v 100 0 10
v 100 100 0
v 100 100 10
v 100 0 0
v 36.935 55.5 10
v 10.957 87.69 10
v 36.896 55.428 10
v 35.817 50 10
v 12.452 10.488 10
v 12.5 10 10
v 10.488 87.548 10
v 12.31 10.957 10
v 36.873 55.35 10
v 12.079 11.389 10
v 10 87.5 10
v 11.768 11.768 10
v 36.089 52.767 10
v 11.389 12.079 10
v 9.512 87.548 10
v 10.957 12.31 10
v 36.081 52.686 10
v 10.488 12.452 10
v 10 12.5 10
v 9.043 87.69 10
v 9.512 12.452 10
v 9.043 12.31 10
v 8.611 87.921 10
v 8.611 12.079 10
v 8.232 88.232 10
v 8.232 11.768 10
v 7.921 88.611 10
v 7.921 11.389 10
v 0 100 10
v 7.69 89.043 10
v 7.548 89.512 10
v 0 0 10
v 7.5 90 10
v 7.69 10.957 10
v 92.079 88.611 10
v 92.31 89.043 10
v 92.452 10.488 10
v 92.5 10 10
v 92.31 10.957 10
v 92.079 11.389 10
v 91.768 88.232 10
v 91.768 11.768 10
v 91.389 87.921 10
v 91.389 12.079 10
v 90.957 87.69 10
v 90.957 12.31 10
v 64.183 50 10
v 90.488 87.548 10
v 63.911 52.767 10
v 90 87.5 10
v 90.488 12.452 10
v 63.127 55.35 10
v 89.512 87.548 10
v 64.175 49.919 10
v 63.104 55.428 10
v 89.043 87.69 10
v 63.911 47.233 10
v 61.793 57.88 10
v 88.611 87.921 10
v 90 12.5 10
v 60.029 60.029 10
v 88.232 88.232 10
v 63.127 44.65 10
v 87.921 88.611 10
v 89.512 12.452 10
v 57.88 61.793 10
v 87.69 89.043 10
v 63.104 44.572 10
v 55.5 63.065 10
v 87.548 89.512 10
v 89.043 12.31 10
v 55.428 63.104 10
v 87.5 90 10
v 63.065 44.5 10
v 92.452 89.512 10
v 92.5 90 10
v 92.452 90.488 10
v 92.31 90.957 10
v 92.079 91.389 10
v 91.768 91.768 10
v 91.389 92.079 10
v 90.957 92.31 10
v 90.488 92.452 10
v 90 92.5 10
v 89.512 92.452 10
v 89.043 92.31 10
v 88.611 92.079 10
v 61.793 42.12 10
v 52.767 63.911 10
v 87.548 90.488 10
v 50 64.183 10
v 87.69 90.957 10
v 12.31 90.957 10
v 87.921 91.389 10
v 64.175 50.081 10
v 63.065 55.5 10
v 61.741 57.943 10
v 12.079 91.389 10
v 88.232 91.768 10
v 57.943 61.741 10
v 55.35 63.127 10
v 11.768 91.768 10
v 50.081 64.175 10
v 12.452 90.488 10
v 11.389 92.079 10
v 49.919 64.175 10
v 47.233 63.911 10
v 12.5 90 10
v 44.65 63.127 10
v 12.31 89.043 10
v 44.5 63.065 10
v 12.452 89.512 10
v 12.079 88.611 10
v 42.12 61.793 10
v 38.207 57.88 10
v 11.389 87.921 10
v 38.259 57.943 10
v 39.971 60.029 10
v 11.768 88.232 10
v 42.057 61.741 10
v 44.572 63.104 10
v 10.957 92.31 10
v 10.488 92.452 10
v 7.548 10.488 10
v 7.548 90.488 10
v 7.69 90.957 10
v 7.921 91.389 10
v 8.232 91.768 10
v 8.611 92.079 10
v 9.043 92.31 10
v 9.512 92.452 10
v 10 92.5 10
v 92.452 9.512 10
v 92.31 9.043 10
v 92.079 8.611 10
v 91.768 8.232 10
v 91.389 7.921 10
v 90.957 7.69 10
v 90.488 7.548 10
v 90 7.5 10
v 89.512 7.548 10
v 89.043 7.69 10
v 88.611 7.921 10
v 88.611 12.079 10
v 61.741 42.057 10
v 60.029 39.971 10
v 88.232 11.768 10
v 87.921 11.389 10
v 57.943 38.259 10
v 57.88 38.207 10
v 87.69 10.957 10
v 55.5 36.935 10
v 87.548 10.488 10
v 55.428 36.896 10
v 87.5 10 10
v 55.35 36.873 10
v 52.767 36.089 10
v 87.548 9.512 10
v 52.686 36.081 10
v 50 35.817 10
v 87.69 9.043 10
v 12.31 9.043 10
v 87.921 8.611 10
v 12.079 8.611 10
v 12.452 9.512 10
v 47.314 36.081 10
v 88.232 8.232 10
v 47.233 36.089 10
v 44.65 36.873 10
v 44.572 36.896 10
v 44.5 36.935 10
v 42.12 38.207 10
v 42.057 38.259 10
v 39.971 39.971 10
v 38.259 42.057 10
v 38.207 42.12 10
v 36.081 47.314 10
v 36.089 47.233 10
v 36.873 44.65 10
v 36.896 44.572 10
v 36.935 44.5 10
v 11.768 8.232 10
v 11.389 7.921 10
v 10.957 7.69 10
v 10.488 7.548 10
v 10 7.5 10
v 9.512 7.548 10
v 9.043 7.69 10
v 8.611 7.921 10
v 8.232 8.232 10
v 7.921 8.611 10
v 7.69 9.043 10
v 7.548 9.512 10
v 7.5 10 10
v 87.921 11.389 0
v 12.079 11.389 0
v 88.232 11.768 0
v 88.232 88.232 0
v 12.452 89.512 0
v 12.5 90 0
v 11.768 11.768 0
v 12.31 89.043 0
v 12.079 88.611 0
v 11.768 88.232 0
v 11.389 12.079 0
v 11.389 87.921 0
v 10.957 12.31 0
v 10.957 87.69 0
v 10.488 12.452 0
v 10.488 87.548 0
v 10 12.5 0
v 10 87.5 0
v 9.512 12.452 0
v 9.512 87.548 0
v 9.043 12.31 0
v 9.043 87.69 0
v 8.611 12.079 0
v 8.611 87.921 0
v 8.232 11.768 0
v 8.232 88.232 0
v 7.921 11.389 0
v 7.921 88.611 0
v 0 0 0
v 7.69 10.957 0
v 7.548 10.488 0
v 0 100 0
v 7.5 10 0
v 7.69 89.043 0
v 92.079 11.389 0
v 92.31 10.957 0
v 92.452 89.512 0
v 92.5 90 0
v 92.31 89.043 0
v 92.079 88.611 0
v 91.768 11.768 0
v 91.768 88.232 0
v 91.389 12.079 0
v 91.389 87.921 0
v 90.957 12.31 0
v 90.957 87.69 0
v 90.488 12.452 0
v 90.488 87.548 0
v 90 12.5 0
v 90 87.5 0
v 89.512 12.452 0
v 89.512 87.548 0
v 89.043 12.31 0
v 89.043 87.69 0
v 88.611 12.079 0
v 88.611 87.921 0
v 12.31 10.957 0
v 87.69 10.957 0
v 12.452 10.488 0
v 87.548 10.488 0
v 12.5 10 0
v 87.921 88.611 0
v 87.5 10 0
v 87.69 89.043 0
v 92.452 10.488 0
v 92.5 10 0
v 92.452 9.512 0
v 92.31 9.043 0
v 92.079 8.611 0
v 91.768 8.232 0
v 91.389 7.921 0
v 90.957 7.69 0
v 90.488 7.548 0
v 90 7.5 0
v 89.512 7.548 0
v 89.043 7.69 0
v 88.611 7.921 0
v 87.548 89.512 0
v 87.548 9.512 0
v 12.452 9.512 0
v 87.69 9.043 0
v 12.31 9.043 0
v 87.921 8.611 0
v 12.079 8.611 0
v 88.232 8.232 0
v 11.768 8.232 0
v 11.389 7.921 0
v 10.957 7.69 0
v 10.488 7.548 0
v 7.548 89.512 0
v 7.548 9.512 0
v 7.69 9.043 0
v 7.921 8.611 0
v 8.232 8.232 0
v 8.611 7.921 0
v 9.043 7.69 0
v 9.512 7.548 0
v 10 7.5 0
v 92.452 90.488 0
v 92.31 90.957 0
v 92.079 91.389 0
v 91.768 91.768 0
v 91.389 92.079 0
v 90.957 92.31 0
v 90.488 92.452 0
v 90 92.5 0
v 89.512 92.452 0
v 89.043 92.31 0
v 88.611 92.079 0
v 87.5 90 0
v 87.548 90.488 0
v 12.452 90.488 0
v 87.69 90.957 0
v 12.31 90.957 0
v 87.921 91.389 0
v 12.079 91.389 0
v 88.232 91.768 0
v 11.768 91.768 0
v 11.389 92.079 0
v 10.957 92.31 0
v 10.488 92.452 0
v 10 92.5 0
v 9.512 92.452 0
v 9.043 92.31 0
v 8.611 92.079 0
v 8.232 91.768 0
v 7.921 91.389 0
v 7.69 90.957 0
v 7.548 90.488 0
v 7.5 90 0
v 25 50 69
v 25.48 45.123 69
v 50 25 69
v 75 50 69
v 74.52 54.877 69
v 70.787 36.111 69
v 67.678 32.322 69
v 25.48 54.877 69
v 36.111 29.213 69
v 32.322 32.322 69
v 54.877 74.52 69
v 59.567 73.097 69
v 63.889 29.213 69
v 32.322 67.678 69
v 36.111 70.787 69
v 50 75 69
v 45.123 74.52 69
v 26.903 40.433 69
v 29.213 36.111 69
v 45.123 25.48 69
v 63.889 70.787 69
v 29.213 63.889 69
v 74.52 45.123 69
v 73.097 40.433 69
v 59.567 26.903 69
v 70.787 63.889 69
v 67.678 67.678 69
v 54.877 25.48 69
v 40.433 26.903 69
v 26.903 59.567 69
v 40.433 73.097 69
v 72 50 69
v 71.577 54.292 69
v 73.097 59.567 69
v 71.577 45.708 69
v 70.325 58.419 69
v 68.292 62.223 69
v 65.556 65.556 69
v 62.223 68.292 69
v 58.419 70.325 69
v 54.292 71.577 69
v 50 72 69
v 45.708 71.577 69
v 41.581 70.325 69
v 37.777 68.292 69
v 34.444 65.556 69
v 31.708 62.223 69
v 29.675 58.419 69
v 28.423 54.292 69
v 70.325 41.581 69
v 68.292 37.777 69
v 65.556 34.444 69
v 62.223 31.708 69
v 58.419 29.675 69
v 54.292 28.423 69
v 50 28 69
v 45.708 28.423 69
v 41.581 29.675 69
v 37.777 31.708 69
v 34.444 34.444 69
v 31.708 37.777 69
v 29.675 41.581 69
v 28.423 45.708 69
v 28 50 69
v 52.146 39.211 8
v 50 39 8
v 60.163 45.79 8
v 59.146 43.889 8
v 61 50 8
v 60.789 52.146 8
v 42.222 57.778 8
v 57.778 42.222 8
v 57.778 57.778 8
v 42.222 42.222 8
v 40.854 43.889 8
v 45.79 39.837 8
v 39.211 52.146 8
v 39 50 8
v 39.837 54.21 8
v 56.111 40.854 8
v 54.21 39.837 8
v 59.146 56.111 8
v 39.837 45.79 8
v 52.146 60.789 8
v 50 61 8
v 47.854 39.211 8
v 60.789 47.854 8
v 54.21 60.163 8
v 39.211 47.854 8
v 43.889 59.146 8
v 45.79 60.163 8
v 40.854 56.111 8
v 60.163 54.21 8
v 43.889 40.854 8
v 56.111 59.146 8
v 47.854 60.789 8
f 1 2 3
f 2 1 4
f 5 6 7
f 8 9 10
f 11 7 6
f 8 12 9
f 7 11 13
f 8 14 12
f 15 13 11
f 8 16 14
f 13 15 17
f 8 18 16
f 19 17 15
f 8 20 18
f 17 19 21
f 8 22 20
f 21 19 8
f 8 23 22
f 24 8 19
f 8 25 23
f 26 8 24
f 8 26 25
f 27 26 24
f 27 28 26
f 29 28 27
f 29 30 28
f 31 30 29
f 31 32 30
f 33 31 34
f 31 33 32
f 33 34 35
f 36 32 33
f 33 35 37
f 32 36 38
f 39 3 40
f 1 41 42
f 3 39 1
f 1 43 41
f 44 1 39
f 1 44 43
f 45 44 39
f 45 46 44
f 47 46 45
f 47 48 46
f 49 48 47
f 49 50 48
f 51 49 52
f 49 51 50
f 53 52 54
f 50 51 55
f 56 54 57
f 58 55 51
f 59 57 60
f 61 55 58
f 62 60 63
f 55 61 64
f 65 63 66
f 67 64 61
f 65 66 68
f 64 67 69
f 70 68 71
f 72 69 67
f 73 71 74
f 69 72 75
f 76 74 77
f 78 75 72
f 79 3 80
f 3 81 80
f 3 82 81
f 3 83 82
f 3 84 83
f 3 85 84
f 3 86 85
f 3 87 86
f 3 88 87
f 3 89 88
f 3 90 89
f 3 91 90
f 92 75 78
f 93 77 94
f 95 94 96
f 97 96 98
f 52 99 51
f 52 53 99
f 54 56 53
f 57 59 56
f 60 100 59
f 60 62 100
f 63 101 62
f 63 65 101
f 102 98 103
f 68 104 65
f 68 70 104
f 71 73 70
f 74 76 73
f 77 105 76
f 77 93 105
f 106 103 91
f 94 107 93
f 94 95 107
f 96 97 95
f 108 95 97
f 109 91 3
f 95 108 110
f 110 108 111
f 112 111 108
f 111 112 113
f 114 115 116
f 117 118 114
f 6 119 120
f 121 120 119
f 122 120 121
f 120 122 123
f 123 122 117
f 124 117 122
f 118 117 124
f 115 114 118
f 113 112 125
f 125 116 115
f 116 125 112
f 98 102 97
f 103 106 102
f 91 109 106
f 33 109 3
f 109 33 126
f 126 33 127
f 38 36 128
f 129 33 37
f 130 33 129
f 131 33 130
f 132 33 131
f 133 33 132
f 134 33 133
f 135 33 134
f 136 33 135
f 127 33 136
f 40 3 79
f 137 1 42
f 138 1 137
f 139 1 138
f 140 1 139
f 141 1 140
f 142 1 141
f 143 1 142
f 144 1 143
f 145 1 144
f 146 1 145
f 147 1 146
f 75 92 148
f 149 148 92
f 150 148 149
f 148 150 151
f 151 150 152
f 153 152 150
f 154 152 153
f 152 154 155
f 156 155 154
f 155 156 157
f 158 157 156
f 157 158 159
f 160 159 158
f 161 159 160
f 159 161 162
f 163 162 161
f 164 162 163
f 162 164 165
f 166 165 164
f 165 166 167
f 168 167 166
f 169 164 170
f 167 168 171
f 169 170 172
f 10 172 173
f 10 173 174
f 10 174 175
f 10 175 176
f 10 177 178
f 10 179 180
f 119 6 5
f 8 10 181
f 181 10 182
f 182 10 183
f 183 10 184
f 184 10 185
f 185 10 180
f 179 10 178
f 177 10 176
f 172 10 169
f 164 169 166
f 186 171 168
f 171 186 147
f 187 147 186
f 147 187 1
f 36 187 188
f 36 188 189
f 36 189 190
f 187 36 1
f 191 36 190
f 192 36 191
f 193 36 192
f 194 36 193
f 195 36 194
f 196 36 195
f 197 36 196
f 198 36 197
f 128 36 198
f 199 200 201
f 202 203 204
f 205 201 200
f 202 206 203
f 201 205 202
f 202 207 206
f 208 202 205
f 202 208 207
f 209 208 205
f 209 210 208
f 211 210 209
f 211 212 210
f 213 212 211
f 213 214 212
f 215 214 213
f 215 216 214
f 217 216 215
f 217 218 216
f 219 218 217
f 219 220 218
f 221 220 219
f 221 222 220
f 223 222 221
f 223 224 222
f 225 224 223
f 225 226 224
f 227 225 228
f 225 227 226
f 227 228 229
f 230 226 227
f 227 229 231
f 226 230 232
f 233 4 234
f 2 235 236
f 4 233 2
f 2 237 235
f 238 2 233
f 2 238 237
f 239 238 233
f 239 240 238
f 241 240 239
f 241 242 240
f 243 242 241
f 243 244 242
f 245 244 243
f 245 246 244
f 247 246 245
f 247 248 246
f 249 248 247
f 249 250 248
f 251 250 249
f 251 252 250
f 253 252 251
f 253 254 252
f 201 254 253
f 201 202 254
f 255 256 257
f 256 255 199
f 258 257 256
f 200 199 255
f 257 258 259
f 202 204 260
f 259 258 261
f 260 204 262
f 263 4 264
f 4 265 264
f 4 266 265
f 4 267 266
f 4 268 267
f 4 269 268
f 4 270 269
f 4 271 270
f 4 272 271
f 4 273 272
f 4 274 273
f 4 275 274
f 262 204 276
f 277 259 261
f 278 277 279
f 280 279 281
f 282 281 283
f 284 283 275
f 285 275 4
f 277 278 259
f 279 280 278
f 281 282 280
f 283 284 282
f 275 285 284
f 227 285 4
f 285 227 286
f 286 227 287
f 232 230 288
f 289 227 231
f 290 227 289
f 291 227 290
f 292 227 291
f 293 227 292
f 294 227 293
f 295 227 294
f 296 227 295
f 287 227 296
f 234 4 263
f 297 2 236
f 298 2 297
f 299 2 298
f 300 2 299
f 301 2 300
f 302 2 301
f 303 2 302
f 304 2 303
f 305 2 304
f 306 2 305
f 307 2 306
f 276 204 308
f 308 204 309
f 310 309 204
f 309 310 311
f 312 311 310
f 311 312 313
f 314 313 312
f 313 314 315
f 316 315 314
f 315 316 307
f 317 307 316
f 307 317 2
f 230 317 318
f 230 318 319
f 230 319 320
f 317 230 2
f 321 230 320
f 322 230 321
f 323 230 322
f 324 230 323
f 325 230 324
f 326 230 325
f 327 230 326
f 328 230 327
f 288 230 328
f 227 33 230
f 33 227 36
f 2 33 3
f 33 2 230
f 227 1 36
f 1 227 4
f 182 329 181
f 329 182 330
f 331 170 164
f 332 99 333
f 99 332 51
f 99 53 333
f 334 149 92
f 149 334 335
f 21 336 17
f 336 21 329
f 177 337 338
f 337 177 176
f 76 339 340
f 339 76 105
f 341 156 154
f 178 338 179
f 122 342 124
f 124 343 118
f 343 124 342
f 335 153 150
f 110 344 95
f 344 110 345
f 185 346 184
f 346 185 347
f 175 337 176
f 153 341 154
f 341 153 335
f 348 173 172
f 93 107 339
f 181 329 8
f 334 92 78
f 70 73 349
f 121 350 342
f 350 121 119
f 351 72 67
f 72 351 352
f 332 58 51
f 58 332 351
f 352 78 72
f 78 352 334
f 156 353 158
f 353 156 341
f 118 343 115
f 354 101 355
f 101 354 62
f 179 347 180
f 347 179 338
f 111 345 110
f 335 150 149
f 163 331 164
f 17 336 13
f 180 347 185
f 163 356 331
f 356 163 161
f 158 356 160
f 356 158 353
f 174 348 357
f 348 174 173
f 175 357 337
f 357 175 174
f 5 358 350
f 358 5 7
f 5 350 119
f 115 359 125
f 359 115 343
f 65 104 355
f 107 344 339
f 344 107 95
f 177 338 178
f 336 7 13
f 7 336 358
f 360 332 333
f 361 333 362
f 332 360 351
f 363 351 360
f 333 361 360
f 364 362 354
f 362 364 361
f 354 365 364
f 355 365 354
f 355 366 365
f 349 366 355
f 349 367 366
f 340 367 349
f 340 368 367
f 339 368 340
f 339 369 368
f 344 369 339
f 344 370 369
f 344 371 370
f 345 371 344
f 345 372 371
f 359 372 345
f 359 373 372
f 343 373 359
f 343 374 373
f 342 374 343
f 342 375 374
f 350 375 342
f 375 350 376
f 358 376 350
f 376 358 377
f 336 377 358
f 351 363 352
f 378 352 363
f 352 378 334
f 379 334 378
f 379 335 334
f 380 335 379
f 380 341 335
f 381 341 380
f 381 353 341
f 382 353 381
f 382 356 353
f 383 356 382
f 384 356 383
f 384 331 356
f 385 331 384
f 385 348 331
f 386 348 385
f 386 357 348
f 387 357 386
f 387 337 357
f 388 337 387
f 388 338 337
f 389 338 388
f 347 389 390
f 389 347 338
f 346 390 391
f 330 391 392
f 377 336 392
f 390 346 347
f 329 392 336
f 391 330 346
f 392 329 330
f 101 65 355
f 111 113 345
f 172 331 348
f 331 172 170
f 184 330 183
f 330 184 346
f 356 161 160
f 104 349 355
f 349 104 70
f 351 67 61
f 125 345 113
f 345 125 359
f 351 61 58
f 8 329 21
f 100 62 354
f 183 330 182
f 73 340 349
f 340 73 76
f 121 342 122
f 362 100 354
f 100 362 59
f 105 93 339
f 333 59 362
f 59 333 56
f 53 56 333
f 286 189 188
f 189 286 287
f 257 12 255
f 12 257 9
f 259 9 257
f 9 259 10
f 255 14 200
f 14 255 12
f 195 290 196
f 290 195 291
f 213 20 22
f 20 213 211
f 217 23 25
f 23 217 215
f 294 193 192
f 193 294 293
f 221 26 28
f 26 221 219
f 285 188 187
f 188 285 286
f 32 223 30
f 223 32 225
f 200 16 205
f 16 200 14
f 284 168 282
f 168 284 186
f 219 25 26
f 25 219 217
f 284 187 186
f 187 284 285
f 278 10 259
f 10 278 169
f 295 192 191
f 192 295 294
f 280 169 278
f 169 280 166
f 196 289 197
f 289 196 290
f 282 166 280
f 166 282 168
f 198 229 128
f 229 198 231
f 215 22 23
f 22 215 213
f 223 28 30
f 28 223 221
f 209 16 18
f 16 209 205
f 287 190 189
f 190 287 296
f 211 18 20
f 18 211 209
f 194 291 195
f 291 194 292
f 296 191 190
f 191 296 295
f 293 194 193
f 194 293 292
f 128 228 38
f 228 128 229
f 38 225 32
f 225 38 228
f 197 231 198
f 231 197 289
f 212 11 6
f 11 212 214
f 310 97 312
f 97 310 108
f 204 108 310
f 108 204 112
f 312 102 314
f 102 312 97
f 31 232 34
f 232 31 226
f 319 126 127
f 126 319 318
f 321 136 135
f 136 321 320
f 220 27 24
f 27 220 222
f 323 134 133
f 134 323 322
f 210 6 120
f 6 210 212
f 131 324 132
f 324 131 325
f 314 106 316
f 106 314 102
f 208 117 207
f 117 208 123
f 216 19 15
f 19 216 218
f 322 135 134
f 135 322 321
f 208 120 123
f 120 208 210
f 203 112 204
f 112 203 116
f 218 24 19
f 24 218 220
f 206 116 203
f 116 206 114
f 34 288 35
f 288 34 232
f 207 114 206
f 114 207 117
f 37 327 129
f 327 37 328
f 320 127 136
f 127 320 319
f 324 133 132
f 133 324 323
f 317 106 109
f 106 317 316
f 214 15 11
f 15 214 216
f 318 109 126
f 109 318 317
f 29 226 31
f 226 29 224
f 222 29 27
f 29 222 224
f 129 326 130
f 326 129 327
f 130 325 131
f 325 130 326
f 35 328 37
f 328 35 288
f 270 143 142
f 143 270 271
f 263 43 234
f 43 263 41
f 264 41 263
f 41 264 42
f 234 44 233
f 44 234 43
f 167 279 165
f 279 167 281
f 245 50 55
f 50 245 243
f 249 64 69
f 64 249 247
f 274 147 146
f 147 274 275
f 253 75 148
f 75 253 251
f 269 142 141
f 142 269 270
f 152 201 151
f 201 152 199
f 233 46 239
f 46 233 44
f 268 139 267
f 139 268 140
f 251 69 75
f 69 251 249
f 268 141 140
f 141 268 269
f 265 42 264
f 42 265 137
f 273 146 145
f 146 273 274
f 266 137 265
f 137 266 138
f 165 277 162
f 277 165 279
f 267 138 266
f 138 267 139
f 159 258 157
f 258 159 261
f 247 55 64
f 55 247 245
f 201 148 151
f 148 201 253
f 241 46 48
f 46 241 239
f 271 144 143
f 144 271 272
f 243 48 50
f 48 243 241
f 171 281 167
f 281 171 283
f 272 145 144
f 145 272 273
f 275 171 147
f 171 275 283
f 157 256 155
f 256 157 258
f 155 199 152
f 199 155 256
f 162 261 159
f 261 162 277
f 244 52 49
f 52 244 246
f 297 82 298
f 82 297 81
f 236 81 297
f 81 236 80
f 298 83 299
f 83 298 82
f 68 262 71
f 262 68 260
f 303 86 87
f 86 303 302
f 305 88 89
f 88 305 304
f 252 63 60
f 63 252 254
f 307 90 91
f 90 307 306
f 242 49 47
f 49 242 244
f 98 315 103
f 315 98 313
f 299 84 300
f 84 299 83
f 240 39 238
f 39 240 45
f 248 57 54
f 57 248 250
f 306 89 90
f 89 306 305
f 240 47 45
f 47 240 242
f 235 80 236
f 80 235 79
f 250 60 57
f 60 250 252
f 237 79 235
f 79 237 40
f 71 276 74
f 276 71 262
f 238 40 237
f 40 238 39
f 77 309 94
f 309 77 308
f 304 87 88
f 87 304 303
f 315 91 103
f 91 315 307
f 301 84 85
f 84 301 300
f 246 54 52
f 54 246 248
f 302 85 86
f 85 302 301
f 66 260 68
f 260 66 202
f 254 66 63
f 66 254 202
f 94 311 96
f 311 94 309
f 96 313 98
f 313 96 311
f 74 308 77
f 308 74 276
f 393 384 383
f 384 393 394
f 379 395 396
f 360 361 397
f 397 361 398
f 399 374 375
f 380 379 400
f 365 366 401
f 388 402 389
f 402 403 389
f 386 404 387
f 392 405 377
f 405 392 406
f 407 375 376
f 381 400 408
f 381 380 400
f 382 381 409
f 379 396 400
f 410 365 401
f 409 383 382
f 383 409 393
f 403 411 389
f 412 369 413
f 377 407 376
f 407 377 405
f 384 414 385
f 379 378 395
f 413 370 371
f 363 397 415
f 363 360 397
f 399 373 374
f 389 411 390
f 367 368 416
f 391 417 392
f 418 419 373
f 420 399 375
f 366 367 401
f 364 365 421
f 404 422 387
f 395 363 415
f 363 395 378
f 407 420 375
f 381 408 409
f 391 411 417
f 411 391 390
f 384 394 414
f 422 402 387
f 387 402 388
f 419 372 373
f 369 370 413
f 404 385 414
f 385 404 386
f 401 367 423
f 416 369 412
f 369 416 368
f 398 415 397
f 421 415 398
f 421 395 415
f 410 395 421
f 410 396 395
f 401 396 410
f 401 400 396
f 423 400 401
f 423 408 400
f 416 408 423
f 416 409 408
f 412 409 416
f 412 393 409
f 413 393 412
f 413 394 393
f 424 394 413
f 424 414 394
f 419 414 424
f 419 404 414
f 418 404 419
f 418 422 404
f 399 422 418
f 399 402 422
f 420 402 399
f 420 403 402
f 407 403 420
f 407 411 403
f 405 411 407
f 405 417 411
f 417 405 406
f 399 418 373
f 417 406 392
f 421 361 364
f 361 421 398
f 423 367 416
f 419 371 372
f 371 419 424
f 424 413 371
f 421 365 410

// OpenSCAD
$fn = 32;

// ----------------------------------------------------------------------
// Hopper: flanged with square flange
// ----------------------------------------------------------------------

// --- parameters (mm) ---
fl = 100;                 // flange side, X and Y
fl_t = 10;                // flange thickness
cone_h = 60;              // cone height above the flange
top_d = 50;               // cone mouth diameter
bot_d = 28;               // cone spout diameter
wall = 3;                 // cone wall thickness
hole_r = 2.5;             // flange hole radius
hole_in = 10;             // hole inset from the corners

bore_d = bot_d - 2 * wall;  // spout bore diameter
total_h = fl_t + cone_h - 1;  // overall height

difference() {
  union() {
    cube([fl, fl, fl_t]);
    translate([fl / 2, fl / 2, fl_t - 1])
      cylinder(h = cone_h, d1 = bot_d, d2 = top_d);
  }
  translate([fl / 2, fl / 2, fl_t - 2])
    cylinder(h = cone_h + 1, d1 = bore_d, d2 = top_d - 2 * wall);
  for (sx = [0, 1], sy = [0, 1])
    translate([sx ? fl - hole_in : hole_in,
               sy ? fl - hole_in : hole_in, -1])
      cylinder(r = hole_r, h = fl_t + 2);
}
